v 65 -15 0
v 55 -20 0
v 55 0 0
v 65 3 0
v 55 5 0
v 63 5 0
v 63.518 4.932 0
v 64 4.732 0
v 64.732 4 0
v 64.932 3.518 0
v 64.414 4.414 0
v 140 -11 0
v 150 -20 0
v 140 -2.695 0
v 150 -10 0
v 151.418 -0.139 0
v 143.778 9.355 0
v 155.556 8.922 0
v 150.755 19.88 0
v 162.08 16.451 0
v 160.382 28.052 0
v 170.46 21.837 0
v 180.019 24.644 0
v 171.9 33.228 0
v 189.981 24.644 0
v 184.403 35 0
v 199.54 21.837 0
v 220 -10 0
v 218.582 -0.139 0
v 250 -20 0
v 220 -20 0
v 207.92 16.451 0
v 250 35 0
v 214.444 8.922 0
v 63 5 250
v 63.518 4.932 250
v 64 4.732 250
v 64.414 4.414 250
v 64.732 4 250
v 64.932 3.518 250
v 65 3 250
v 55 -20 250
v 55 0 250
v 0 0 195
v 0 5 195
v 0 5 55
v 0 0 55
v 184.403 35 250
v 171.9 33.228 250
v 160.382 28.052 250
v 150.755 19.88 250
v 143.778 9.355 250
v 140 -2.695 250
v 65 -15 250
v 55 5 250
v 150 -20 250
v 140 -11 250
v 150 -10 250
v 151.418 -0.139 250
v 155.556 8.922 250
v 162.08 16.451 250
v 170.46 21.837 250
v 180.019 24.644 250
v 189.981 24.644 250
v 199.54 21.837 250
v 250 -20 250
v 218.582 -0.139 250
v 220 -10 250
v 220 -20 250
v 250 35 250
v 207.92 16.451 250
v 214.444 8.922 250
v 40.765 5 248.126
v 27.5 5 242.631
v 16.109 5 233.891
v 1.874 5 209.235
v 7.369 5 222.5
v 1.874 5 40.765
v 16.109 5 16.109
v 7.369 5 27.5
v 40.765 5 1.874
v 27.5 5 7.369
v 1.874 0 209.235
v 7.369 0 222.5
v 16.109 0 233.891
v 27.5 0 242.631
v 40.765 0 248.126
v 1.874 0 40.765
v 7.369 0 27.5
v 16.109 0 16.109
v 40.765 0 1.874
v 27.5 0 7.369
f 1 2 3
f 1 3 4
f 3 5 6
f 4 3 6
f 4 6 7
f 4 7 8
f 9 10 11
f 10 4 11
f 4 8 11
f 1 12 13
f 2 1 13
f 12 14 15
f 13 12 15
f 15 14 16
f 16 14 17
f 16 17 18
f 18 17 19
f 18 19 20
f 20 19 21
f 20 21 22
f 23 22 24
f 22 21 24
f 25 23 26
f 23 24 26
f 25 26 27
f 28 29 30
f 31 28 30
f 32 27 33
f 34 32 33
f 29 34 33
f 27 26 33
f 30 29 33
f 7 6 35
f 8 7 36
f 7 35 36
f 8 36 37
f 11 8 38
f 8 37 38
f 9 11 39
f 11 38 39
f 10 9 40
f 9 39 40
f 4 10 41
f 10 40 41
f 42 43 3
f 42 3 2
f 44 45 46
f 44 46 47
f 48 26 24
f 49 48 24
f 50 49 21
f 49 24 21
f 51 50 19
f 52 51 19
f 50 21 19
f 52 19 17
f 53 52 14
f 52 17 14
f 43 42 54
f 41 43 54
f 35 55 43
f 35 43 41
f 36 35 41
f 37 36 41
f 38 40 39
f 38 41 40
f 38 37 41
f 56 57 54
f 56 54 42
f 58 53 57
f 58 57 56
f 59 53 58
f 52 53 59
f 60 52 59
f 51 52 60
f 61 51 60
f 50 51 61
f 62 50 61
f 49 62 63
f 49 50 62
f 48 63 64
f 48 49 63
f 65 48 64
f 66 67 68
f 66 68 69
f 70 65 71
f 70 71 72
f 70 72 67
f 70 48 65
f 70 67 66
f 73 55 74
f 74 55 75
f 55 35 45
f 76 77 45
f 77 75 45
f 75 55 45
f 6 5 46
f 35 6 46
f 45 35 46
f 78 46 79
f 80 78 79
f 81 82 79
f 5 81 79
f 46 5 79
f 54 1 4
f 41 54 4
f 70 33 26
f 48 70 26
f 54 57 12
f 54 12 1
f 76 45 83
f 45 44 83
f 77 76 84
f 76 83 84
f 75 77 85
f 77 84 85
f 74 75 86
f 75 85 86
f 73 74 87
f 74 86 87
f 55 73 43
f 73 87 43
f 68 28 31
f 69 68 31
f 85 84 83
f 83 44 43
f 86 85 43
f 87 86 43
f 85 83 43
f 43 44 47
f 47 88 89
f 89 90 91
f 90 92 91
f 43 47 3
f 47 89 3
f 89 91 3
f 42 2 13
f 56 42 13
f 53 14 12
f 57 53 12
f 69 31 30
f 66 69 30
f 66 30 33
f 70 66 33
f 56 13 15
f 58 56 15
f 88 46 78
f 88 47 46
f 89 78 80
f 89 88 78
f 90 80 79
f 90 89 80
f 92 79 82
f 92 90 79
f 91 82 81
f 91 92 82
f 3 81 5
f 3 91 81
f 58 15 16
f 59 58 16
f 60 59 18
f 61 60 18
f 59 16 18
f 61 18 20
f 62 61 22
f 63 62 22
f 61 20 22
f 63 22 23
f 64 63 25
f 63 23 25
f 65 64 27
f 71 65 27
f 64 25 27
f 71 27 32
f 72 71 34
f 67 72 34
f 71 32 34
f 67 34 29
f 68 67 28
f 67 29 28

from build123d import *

# Parameters (mm, degrees)
BOSS_EXTRU_1_DEPTH = 250
CONG_1_R           = 55
CONG_2_R           = 2


with BuildPart() as part:
    # Esquisse1 → Boss.-Extru.1 (new body)
    with BuildSketch(Plane.XY):
        with BuildLine():
            Line((0, 0), (55, 0))
            Line((55, 0), (55, -20))
            Line((55, -20), (150, -20))
            Line((150, -20), (150, -10))
            ThreePointArc((150, -10), (185, 25), (220, -10))
            Line((220, -10), (220, -20))
            Line((220, -20), (250, -20))
            Line((250, -20), (250, 35))
            Line((250, 35), (184.403047163, 35))
            ThreePointArc((184.403047163, 35), (155.280415441, 24.305572748), (140, -2.694563485))
            Line((140, -2.694563485), (140, -11))
            Line((140, -11), (65, -15))
            Line((65, -15), (65, 5))
            Line((65, 5), (0, 5))
            Line((0, 5), (0, 0))
        make_face()
    extrude(amount=BOSS_EXTRU_1_DEPTH)

    # Congé1
    cong_1_edges = [part.edges().sort_by_distance(p)[0] for p in [
        (0, 2.5, 0),
        (0, 2.5, 250),
    ]]
    fillet(cong_1_edges, radius=CONG_1_R)

    # Congé2
    cong_2_edges = [part.edges().sort_by_distance(p)[0] for p in [
        (65, 5, 125),
    ]]
    fillet(cong_2_edges, radius=CONG_2_R)


solid = part.part
